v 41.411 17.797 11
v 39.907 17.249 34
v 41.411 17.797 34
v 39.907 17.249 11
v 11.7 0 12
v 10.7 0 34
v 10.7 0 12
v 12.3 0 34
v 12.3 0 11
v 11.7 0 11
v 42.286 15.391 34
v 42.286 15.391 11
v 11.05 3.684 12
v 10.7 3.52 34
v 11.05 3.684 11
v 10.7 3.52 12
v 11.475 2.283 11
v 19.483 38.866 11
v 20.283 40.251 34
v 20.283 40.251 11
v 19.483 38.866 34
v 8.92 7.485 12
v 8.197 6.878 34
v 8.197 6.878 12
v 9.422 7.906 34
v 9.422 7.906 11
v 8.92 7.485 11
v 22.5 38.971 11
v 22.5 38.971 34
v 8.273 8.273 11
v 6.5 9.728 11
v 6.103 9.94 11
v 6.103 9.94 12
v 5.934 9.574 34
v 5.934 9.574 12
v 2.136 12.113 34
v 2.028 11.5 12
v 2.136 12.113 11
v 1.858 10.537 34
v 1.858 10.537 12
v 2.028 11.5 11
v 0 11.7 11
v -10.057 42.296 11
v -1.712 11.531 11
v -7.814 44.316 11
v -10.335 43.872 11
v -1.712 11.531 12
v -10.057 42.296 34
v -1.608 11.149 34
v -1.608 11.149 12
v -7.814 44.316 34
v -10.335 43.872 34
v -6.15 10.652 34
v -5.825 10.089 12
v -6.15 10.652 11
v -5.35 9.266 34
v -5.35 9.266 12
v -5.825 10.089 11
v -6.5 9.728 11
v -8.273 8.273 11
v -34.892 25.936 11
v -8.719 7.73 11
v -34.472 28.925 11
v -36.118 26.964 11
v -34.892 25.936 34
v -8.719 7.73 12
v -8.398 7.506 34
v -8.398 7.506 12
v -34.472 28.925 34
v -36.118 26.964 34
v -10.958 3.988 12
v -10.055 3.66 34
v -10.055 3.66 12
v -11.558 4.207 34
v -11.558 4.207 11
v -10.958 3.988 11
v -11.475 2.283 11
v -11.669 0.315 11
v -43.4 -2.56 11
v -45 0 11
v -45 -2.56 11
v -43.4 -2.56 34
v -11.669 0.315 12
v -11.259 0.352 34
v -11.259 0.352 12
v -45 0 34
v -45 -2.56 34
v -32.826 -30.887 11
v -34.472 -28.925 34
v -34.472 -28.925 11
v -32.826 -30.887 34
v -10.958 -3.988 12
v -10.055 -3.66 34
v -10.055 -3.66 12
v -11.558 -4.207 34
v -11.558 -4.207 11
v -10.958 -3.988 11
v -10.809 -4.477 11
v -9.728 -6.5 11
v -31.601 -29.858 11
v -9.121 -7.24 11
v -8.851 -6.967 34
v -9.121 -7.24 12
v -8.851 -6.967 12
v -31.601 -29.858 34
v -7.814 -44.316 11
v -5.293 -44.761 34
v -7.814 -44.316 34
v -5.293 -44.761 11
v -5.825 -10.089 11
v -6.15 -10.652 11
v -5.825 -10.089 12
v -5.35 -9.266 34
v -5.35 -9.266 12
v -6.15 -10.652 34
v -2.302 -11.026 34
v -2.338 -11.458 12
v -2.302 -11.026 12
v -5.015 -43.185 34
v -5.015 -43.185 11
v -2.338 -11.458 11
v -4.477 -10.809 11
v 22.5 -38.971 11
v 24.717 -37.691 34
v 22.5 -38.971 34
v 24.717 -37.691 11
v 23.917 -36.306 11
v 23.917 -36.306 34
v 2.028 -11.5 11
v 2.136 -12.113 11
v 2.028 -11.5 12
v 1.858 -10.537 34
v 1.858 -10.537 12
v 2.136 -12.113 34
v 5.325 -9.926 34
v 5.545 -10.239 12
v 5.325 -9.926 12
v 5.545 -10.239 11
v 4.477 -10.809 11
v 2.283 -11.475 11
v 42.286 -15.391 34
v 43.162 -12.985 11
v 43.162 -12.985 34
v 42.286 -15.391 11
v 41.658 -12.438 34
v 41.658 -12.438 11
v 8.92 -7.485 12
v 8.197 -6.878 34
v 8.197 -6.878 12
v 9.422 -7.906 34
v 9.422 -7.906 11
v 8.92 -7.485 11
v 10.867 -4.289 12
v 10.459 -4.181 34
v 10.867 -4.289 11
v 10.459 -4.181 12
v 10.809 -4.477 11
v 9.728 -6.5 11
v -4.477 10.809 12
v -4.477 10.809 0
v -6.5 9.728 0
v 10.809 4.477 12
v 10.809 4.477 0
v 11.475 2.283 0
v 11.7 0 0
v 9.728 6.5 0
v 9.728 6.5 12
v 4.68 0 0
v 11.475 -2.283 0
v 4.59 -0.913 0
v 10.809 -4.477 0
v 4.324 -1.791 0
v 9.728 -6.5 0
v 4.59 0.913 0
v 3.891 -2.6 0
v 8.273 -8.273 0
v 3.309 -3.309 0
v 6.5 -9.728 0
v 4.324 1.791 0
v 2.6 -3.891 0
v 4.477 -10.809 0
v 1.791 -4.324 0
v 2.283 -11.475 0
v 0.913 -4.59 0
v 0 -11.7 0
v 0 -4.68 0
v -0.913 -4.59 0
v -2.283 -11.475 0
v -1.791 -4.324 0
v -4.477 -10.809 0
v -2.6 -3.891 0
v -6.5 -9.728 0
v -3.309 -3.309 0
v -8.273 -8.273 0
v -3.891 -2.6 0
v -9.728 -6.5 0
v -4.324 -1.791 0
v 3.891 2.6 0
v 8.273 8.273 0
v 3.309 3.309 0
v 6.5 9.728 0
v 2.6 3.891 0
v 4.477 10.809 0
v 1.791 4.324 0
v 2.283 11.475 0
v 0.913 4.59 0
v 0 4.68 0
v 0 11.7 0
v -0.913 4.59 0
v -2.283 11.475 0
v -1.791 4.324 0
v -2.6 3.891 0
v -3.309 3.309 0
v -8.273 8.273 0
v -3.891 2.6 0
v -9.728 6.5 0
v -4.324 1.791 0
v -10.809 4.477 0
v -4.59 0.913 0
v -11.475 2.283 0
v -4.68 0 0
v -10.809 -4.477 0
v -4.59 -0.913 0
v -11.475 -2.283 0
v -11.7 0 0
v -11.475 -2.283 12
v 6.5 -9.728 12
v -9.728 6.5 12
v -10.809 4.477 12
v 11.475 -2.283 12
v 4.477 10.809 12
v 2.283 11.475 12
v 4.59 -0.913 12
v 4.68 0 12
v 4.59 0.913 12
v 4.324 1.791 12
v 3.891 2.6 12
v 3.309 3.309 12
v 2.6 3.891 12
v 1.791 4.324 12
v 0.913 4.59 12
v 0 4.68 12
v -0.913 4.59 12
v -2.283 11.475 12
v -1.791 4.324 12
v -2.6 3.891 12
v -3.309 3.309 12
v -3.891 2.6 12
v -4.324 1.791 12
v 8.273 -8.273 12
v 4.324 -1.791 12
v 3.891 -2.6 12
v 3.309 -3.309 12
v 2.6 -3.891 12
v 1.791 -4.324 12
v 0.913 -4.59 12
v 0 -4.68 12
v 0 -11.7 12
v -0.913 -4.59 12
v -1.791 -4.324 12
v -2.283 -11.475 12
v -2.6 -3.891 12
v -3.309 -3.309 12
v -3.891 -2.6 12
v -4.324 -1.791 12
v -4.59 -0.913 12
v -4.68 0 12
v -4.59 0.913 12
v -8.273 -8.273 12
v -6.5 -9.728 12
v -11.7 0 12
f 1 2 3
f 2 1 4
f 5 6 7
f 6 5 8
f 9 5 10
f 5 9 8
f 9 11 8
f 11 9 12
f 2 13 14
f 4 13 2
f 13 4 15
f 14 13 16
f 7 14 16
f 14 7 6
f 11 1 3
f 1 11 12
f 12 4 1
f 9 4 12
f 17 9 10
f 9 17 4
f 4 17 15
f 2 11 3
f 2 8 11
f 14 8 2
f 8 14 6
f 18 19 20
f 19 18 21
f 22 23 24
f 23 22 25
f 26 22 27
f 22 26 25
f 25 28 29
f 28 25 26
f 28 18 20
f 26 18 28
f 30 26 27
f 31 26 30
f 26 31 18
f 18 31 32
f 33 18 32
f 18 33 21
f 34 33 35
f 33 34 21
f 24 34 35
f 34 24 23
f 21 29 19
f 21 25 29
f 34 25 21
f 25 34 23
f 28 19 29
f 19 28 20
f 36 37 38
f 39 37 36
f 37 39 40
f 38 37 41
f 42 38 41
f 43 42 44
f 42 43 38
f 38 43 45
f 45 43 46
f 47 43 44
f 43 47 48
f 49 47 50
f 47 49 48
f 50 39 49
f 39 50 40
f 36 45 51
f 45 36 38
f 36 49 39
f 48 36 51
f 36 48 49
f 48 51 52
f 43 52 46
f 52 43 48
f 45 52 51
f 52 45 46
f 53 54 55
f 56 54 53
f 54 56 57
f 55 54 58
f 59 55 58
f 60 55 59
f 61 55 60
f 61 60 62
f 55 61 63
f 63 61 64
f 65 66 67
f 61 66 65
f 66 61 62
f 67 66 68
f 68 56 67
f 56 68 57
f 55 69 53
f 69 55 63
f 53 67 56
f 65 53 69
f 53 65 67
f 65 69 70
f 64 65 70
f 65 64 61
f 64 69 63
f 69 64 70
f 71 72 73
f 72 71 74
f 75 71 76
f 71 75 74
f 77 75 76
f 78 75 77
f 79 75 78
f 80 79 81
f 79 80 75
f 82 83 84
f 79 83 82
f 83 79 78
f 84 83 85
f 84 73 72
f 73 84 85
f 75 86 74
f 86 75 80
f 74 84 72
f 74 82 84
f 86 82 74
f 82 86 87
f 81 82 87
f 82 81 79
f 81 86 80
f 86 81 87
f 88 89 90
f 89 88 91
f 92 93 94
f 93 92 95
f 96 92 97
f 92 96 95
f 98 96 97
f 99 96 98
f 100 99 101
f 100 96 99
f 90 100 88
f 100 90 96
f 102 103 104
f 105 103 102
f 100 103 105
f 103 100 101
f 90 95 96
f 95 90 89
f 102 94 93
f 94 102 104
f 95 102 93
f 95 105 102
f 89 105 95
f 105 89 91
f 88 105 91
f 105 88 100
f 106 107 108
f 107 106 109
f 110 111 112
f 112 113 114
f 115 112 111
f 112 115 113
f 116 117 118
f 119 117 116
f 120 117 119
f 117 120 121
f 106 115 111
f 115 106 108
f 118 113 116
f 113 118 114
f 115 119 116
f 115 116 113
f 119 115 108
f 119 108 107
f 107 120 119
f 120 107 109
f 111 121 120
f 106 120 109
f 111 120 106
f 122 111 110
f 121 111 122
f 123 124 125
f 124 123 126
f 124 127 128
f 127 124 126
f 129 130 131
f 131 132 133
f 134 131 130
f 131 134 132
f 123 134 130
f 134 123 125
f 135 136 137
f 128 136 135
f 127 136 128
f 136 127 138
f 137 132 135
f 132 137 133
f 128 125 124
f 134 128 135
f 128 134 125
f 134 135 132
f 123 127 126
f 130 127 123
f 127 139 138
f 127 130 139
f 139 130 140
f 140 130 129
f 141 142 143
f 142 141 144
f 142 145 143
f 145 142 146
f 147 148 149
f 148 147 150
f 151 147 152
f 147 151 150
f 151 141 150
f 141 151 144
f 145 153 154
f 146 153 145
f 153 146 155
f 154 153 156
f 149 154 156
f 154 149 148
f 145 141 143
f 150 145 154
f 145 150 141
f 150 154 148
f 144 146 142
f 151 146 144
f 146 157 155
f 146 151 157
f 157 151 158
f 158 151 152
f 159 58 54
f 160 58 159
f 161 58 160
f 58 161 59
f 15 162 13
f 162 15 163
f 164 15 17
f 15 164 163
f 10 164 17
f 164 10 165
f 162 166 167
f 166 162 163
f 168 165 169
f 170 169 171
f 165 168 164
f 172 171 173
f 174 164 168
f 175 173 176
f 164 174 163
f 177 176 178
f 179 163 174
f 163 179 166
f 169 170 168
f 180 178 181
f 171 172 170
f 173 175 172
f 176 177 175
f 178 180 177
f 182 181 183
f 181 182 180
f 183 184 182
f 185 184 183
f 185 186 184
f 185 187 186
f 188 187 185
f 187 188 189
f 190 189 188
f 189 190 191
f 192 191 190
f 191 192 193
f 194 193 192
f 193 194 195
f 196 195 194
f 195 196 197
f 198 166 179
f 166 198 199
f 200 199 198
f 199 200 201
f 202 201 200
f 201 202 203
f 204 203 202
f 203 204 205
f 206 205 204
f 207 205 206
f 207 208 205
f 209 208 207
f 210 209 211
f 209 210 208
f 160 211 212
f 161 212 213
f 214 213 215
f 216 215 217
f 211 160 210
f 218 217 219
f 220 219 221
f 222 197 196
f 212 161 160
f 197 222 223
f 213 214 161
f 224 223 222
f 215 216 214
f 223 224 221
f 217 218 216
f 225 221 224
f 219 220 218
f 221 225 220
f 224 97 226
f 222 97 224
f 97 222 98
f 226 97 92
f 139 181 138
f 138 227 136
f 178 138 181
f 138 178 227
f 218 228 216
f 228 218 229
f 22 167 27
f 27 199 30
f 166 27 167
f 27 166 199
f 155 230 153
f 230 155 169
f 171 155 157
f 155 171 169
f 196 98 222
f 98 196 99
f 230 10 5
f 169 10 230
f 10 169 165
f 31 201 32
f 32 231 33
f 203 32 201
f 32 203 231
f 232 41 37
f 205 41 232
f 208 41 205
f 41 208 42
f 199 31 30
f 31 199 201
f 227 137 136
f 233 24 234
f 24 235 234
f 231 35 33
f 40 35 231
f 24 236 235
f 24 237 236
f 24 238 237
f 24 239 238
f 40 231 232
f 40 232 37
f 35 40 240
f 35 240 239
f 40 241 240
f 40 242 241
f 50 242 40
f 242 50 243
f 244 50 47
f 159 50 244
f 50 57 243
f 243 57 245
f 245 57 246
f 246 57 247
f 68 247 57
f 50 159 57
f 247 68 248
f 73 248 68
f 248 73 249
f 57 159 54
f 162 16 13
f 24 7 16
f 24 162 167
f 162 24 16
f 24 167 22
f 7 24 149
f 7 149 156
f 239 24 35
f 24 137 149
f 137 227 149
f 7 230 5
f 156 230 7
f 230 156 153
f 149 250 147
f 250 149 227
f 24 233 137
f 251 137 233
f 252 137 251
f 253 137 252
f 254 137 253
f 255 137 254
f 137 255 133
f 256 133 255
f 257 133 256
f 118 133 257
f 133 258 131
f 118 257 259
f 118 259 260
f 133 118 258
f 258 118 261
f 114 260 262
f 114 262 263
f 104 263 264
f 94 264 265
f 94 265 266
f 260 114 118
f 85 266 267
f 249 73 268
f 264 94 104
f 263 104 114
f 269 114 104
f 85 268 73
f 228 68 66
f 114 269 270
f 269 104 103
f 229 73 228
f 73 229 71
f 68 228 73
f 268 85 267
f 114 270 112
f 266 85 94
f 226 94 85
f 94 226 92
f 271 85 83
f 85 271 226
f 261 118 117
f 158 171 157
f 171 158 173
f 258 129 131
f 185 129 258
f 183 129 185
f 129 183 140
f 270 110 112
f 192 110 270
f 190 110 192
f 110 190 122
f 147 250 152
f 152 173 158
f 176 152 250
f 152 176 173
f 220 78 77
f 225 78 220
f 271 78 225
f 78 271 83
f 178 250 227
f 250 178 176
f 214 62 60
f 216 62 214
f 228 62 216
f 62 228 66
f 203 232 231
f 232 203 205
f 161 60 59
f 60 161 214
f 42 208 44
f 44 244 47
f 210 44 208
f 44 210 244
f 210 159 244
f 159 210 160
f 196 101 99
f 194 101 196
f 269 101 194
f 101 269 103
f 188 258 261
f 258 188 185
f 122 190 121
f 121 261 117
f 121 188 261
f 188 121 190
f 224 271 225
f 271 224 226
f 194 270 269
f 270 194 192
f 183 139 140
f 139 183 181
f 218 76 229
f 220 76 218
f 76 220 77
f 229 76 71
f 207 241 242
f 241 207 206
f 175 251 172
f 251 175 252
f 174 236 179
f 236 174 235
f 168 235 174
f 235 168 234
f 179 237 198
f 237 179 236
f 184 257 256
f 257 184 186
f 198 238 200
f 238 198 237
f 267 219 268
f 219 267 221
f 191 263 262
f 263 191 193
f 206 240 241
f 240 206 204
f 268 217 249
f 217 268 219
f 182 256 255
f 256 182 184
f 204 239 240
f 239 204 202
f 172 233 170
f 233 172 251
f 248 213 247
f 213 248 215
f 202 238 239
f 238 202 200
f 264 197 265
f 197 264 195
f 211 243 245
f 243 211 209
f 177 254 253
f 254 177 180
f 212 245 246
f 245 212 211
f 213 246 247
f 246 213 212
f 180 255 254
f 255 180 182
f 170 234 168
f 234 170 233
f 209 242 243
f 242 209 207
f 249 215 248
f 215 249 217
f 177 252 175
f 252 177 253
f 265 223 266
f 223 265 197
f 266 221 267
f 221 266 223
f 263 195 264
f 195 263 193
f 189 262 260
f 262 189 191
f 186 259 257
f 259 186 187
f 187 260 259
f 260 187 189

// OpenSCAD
$fn = 32;

// ----------------------------------------------------------------------
// Impeller: 90 mm, 9 blades, 34 mm tall
// ----------------------------------------------------------------------

// --- parameters (mm) ---
hub_d = 23.4;             // hub diameter
hub_h = 12;               // hub height
imp_d = 90;               // outer diameter over the blades
blades = 9;               // number of blades
blade_t = 1.6;            // blade thickness
blade_h = 22;             // blade height
blade_in_r = 10.7;        // blade root radius
blade_out_r = 43.4;       // blade tip radius
sweep = 20;               // blade sweep, degrees
bore_d = 9.36;            // shaft bore

module hub() {
  cylinder(h = hub_h, d = hub_d);
}

module blade() {
  /* blade swept between two boxes: hull of the root and the tip section */
  hull() {
    translate([blade_in_r, 0, hub_h - 1])
      cube([blade_t, blade_t * 2.2, blade_h + 1], center = false);
    rotate([0, 0, sweep])
      translate([blade_out_r, 0, hub_h - 1])
        cube([blade_t, blade_t * 1.6, blade_h + 1], center = false);
  }
}

module blades() {
  for (i = [0 : blades - 1])
    rotate([0, 0, i * 360 / blades]) blade();
}

difference() {
  union() {
    hub();
    blades();
  }
  translate([0, 0, -1]) cylinder(h = hub_h + blade_h + 0 + 3, d = bore_d);
}
